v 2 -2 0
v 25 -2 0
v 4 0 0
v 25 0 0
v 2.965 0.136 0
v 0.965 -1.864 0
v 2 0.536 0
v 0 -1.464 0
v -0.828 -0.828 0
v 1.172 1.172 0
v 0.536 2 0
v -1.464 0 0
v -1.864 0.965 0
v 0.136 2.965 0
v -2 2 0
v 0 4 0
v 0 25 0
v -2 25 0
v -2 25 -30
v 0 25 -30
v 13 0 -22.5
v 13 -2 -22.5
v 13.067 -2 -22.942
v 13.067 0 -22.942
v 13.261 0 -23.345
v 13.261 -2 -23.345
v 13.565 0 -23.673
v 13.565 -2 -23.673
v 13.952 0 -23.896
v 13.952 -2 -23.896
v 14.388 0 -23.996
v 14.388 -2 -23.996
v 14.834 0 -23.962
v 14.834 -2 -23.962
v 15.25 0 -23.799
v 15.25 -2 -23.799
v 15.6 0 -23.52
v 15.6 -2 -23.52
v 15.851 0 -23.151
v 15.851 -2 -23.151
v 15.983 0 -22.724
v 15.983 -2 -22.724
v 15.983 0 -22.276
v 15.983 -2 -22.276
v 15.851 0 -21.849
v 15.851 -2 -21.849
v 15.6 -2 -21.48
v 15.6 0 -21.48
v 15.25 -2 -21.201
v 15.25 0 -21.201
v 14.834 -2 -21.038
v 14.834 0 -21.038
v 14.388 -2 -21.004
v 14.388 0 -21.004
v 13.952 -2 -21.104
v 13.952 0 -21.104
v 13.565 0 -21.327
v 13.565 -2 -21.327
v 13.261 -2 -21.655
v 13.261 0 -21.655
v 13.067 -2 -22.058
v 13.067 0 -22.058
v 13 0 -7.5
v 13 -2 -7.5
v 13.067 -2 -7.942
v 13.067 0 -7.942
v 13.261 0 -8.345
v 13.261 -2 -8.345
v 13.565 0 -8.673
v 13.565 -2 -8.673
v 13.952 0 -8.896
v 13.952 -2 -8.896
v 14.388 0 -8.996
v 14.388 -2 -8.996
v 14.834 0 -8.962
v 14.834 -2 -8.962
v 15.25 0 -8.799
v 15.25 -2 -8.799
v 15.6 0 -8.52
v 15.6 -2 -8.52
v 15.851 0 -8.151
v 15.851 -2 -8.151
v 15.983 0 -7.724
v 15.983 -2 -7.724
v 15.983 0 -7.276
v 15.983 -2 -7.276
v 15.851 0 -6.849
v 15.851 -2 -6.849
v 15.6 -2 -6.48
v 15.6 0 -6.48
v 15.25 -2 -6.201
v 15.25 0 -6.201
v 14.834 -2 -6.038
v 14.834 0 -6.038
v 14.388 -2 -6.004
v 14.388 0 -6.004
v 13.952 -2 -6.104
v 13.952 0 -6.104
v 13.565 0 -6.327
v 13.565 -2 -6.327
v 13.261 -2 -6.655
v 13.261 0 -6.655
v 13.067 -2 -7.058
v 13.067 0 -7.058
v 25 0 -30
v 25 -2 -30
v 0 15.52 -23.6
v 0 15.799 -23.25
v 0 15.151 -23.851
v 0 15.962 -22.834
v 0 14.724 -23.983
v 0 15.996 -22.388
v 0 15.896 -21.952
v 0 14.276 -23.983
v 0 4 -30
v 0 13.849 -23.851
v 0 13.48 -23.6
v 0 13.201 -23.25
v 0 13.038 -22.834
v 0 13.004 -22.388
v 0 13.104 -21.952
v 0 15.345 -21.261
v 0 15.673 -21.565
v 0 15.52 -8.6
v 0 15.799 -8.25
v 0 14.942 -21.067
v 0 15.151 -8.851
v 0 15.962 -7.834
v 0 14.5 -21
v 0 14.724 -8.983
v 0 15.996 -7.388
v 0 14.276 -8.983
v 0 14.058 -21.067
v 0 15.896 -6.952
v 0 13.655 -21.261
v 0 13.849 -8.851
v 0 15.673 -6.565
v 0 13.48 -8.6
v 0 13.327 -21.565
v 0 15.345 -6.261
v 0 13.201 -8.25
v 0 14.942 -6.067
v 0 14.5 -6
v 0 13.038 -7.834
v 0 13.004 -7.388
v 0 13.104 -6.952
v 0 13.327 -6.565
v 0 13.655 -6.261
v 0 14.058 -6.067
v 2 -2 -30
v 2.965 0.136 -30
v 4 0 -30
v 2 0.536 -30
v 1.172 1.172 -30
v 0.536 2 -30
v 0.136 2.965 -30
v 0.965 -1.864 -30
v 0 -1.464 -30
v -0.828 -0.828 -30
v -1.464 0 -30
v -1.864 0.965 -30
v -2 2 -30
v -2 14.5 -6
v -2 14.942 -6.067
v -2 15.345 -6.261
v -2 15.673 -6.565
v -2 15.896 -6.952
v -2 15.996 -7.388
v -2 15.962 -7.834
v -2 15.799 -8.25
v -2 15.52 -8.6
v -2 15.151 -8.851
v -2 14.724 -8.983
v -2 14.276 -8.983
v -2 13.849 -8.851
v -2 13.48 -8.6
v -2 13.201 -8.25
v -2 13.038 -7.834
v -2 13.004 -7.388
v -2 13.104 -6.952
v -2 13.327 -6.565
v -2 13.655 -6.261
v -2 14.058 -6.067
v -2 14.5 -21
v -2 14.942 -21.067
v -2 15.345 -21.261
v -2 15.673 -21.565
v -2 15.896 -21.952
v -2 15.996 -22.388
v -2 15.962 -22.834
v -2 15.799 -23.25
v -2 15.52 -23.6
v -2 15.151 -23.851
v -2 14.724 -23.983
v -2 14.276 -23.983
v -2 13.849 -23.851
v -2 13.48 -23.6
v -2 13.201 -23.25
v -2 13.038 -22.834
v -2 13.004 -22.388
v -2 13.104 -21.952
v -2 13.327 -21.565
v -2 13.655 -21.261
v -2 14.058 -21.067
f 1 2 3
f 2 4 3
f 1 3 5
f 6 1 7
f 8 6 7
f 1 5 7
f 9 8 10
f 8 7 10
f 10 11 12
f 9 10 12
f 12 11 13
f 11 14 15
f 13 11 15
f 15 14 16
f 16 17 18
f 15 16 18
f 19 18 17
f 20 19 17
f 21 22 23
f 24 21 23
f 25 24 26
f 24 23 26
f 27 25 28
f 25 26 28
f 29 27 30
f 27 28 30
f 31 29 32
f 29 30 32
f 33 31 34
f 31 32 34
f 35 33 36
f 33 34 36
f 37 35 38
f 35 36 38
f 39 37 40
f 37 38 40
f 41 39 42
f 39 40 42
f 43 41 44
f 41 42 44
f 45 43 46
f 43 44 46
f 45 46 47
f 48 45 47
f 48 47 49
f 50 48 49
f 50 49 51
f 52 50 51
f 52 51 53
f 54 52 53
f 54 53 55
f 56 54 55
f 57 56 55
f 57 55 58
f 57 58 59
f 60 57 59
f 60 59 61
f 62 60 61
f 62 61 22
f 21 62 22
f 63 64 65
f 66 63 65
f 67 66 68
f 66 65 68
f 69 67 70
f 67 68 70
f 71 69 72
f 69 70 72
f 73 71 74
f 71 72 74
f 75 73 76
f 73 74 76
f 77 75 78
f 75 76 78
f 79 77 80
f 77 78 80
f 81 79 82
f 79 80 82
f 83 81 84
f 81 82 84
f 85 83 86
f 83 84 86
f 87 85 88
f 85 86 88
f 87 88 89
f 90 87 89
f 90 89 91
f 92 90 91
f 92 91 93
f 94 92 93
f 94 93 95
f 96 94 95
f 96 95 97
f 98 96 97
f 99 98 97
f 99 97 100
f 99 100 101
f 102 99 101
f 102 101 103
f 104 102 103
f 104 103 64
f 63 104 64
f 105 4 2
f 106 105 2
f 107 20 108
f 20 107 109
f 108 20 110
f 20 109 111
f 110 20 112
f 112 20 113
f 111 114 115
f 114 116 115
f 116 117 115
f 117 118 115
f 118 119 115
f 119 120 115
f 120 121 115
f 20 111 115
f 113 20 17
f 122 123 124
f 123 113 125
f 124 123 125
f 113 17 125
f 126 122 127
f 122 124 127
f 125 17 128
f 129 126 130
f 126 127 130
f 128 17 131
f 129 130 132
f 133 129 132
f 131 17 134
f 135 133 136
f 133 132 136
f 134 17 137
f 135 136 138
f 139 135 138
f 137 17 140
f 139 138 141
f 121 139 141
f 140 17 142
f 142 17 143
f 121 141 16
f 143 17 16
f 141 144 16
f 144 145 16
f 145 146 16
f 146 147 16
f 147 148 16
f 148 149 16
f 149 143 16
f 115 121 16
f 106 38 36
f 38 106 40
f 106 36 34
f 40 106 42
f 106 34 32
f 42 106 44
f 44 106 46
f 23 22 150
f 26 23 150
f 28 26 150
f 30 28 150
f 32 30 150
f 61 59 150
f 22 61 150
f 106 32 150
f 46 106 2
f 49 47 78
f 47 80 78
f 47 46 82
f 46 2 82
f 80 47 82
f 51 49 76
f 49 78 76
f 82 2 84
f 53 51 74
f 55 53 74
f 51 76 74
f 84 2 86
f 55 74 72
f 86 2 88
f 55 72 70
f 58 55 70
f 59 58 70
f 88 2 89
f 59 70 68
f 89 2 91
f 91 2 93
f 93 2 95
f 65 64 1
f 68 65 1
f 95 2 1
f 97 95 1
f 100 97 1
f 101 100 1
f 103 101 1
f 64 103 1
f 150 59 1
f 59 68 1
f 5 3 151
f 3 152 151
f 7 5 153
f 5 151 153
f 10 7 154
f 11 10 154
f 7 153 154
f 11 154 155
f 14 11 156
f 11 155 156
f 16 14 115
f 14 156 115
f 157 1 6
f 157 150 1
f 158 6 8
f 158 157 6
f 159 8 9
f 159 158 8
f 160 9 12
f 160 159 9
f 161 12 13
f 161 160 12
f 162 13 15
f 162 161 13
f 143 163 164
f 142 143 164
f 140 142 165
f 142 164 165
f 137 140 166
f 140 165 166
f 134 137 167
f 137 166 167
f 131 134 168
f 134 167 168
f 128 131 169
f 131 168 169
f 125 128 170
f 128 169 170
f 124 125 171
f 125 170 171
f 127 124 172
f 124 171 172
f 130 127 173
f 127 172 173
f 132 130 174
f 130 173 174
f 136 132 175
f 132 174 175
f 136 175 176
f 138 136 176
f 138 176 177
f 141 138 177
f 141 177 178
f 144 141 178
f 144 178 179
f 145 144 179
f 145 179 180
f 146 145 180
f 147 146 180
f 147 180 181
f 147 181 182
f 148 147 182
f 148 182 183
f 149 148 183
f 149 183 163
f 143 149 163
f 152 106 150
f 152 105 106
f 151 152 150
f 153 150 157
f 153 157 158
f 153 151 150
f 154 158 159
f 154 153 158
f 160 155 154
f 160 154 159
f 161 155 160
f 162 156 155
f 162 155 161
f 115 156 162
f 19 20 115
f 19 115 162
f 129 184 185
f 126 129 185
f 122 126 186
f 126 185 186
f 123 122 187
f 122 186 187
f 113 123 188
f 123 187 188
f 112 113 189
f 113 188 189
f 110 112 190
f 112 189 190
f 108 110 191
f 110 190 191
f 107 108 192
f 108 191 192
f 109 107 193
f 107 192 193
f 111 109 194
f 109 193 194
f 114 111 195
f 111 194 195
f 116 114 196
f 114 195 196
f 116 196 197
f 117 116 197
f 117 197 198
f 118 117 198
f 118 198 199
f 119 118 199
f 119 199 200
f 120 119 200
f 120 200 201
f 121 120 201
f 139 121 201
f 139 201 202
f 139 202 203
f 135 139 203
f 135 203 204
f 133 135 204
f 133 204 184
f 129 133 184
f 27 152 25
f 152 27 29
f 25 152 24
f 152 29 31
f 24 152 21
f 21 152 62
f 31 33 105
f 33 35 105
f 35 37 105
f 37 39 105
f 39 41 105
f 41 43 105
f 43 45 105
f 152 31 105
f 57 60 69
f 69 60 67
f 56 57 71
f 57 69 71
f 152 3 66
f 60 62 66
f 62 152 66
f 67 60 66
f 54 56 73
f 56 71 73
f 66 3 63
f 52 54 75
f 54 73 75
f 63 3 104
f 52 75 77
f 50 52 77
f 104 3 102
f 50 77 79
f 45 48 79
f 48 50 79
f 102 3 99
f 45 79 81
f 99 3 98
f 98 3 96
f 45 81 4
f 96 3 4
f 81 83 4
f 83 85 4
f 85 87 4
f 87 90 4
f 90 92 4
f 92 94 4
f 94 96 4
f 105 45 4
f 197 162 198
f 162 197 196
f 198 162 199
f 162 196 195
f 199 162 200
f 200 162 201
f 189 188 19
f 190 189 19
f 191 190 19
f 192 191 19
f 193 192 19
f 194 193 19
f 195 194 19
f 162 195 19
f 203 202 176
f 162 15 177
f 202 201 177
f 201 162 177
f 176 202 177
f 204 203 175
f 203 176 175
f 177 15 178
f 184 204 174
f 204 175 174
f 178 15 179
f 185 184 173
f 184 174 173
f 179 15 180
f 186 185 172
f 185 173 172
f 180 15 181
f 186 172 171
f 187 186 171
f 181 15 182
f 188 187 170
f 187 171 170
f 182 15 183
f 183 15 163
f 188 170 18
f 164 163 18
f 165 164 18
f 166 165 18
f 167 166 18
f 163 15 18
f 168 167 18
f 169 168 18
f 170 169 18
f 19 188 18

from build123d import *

# Parameters (mm, degrees)
BOSS_EXTRUDE1_DEPTH       = 30
FILLET1_R                 = 4
FILLET2_R                 = 4
F_3_0MM_DOWEL_HOLE1_D     = 3
F_3_0MM_DOWEL_HOLE1_DEPTH = 2
F_3_0MM_DOWEL_HOLE2_D     = 3
F_3_0MM_DOWEL_HOLE2_DEPTH = 2


with BuildPart() as part:
    # Sketch1 → Boss-Extrude1 (new body)
    with BuildSketch(Plane.XY):
        Polygon((0, 0), (25, 0), (25, -2), (-2, -2), (-2, 25), (0, 25), align=None)
    extrude(amount=-BOSS_EXTRUDE1_DEPTH)

    # Fillet1
    fillet1_edges = [part.edges().sort_by_distance(p)[0] for p in [
        (0, 0, -15),
    ]]
    fillet(fillet1_edges, radius=FILLET1_R)

    # Fillet2
    fillet2_edges = [part.edges().sort_by_distance(p)[0] for p in [
        (-2, -2, -15),
    ]]
    fillet(fillet2_edges, radius=FILLET2_R)

    # Ø3.0mm Dowel Hole1
    with Locations(Plane(origin=(0, 0, 0), x_dir=(1, 0, 0), z_dir=(0, 1, 0))):
        with Locations((14.5, 22.5), (14.5, 7.5)):
            Hole(F_3_0MM_DOWEL_HOLE1_D / 2, depth=F_3_0MM_DOWEL_HOLE1_DEPTH)

    # Ø3.0mm Dowel Hole2
    with Locations(Plane(origin=(0, 0, 0), x_dir=(0, 0, -1), z_dir=(1, 0, 0))):
        with Locations((7.5, 14.5), (22.5, 14.5)):
            Hole(F_3_0MM_DOWEL_HOLE2_D / 2, depth=F_3_0MM_DOWEL_HOLE2_DEPTH)


solid = part.part
